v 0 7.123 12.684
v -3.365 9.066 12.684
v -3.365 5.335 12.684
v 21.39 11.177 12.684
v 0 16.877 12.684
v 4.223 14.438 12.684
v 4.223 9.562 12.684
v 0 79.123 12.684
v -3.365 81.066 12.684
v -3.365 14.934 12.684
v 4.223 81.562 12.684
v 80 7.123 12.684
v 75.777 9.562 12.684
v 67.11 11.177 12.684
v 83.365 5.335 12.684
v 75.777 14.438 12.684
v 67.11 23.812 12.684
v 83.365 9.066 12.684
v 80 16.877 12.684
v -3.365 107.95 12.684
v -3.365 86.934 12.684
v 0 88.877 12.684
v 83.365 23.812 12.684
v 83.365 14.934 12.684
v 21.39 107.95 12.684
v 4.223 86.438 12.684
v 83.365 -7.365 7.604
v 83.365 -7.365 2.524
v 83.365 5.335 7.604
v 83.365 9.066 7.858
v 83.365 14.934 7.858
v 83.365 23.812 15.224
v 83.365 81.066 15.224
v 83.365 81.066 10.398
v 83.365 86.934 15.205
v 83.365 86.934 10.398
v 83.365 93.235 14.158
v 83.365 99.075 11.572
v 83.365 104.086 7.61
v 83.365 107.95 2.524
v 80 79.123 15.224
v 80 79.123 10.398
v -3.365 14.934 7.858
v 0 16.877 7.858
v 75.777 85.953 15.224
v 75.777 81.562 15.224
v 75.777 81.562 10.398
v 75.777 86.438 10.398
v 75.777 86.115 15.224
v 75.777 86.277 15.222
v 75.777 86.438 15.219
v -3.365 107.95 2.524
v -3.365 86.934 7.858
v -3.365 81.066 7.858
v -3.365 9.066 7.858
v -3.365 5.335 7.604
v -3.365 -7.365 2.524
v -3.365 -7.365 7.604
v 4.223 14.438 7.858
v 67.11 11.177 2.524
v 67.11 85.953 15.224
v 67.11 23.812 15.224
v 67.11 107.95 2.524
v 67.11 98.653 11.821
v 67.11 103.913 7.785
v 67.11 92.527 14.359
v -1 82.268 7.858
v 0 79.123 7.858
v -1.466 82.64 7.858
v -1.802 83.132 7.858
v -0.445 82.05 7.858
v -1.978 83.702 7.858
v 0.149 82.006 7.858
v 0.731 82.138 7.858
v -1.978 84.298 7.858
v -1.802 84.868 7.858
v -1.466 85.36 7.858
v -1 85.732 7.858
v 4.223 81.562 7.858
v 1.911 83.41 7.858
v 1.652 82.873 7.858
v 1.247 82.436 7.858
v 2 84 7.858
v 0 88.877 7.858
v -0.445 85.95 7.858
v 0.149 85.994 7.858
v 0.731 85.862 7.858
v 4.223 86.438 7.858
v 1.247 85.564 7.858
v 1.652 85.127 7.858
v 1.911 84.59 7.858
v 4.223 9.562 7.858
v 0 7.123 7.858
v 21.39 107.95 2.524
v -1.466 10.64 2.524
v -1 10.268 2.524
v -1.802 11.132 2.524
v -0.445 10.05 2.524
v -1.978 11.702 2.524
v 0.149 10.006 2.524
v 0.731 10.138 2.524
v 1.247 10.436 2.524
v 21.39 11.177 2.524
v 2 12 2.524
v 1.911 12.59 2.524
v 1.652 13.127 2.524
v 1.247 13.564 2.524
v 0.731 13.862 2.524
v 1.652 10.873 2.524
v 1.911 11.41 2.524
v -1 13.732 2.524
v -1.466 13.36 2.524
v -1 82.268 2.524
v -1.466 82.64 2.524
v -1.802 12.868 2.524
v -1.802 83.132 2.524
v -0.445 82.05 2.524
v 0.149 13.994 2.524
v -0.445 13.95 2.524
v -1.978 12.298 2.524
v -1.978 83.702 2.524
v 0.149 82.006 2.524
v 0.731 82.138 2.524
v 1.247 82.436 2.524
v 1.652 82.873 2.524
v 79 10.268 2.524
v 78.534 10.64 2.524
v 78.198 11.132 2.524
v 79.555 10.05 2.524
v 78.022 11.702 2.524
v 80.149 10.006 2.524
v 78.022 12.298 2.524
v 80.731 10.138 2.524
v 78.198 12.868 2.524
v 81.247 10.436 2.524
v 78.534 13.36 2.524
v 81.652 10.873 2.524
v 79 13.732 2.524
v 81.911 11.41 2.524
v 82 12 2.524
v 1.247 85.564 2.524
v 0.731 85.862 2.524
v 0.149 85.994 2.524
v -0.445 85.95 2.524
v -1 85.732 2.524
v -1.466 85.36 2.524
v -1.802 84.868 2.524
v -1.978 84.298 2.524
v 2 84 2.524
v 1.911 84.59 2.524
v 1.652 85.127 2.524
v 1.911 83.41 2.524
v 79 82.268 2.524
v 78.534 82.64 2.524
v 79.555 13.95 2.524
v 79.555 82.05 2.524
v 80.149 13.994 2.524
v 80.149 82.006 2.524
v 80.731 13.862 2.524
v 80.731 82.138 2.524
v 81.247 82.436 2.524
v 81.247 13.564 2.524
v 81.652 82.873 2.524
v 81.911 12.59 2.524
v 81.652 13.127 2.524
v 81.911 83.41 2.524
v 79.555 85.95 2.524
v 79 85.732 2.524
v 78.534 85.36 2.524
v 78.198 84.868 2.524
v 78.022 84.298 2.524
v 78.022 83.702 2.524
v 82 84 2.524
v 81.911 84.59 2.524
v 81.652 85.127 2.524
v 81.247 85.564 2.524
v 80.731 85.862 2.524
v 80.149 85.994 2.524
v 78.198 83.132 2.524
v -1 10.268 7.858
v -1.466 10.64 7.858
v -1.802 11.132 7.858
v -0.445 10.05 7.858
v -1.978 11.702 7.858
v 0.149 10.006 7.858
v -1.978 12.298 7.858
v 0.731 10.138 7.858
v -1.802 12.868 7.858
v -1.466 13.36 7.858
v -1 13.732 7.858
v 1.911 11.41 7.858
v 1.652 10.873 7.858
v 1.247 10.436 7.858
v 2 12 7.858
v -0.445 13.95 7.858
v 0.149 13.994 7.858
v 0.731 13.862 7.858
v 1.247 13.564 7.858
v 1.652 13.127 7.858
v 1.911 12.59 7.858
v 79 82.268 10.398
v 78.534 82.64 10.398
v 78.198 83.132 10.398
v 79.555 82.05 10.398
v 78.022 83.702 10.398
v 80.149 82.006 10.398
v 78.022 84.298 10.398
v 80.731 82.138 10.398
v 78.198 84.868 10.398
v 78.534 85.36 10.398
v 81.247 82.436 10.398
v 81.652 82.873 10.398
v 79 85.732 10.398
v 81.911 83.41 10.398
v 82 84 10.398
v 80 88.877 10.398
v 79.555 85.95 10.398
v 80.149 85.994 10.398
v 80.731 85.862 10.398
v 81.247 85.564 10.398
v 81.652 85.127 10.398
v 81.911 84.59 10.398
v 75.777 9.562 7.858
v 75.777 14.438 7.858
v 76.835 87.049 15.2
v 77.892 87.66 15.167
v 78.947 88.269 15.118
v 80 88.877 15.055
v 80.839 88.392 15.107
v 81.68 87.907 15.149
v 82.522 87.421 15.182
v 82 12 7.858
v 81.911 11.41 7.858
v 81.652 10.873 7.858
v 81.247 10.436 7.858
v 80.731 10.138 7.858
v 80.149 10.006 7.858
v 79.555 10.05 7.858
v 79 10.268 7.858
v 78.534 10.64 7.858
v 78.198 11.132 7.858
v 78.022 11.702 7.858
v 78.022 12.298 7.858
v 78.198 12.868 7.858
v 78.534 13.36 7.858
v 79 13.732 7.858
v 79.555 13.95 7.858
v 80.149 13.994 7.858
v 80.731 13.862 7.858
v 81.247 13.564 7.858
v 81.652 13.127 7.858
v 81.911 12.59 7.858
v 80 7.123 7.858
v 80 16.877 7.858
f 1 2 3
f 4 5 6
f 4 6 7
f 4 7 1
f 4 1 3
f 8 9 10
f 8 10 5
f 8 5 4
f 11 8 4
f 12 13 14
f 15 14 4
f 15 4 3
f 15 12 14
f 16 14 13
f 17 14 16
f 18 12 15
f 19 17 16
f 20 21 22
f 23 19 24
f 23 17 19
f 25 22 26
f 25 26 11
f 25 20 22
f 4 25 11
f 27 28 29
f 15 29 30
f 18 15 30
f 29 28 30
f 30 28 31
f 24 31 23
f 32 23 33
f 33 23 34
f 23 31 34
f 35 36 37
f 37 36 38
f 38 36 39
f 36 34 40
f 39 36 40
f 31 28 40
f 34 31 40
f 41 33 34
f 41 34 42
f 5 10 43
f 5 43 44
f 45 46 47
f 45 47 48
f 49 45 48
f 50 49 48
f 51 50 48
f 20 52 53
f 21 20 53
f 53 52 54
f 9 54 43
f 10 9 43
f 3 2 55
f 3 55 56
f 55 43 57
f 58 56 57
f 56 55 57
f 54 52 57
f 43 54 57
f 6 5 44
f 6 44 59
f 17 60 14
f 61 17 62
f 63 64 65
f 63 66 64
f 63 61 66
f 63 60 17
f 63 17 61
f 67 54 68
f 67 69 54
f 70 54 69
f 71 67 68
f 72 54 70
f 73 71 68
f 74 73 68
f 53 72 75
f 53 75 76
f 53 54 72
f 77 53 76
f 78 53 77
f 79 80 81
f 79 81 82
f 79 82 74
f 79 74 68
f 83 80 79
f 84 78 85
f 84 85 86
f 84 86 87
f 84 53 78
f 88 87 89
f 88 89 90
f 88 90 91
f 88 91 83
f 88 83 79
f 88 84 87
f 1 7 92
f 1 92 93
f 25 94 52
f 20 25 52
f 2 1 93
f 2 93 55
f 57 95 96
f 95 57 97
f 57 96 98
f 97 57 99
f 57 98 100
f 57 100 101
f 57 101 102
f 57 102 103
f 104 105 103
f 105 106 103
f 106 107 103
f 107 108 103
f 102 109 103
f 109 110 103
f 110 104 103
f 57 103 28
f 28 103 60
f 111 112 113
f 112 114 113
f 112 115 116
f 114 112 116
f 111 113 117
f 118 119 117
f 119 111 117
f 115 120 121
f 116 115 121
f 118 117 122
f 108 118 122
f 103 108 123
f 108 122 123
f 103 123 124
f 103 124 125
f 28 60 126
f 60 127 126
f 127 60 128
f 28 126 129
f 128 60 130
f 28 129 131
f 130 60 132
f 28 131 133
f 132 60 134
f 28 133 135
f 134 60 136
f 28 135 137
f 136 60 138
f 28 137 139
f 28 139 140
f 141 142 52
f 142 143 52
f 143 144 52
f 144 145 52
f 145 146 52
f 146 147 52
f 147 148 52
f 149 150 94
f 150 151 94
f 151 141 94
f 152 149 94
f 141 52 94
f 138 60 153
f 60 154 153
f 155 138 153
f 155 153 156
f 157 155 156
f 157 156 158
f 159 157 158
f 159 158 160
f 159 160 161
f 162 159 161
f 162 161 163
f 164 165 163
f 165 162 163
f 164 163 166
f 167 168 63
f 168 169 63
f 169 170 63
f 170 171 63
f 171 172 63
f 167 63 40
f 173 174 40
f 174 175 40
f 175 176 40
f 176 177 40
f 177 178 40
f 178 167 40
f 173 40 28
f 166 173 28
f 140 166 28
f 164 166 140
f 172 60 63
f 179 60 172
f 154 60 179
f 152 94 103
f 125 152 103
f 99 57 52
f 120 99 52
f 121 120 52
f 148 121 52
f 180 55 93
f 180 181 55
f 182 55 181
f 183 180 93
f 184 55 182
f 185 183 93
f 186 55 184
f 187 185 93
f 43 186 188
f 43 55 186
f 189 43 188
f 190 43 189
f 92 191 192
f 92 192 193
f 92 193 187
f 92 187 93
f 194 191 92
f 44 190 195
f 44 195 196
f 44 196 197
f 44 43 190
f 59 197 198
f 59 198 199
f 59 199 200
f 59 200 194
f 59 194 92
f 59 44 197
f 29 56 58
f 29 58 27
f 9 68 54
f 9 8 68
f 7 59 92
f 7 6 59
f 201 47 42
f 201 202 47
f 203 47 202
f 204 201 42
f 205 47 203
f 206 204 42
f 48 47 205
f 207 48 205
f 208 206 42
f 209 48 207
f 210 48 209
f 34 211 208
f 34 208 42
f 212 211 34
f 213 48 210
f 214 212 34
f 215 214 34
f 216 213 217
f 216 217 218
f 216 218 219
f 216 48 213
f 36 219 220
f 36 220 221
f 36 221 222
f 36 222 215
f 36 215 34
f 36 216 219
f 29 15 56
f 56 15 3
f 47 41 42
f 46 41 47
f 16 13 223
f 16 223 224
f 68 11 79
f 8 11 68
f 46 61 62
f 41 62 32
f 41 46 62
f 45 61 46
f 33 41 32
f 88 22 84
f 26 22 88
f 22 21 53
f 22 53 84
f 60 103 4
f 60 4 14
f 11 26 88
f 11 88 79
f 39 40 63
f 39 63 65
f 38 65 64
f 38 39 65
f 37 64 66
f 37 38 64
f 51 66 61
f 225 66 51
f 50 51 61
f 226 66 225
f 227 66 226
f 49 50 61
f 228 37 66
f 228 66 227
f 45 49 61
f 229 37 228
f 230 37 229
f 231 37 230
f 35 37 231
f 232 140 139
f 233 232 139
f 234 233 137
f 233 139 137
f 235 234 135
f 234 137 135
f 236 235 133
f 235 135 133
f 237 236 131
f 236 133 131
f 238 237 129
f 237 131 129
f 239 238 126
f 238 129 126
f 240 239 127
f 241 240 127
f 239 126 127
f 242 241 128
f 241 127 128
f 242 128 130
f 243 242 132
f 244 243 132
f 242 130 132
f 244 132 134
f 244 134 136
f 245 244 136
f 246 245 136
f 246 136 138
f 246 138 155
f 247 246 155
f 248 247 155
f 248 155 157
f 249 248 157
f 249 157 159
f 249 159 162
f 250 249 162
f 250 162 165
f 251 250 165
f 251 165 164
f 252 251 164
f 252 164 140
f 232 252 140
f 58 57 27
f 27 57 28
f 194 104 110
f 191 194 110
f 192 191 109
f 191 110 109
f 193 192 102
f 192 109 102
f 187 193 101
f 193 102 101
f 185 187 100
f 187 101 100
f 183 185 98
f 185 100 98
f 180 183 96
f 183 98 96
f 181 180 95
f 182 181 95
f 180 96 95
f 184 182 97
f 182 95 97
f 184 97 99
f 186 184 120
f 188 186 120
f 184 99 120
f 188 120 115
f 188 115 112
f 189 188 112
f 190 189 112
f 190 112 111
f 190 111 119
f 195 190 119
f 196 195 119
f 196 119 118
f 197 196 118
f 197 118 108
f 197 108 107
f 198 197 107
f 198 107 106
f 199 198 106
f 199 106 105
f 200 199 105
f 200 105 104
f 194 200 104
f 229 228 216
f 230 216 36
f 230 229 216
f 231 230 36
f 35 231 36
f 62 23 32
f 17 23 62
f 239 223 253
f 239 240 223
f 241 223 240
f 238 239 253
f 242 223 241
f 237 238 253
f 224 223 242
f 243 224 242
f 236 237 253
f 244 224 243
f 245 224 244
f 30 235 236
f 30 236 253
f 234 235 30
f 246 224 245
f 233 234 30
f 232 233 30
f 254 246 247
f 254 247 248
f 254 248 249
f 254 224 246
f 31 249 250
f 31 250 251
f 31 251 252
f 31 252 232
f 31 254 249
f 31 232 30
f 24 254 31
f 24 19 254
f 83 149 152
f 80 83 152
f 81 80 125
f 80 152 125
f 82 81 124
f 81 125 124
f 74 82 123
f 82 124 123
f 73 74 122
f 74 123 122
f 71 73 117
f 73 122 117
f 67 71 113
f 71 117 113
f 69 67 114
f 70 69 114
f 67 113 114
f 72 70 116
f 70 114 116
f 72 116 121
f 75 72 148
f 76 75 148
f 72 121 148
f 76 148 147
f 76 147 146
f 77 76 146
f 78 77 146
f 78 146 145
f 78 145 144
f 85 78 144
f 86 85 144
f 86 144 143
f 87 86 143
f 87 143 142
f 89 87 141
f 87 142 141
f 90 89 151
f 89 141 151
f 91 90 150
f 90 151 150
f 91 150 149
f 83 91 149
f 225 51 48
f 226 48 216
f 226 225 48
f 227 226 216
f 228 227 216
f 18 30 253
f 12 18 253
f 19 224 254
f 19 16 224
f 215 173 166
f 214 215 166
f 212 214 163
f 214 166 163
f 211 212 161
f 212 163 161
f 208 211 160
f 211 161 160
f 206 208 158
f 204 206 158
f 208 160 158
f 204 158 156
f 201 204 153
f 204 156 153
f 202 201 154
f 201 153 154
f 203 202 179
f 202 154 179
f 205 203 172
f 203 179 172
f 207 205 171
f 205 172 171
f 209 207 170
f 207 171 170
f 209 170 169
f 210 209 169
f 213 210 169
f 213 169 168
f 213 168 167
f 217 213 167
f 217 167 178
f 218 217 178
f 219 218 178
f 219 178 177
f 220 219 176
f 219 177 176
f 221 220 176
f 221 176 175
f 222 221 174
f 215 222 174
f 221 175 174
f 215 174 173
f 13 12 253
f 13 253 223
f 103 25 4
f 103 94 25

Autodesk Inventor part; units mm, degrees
ref_plane "YZ Plane" through (0, 0, 0) normal (1, 0, 0) x (0, 1, 0)
ref_plane "XZ Plane" through (0, 0, 0) normal (0, 1, 0) x (-1, 0, 0)
ref_plane "Work Plane1" through (0, 0, 2.5241) normal (0, 0, 1) x (1, 0, 0)
sketch "Sketch1" plane through (0, 0, 2.5241) normal (0, 0, 1) x (1, 0, 0)
  line L0 (-4, 272) -> (-4, -8) construction
  line L1 (4, 272) -> (4, -8) construction
  line L2 (76, 272) -> (76, -8) construction
  line L3 (84, 272) -> (84, -8) construction
  line L4 (84, -8) -> (-4, -8) construction
  line L5 (84, 106) -> (80, 106) construction
  line L6 (80, 110) -> (76, 110) construction
  line L7 (-3.365, 272) -> (-3.365, -7.365) construction
  line L8 (-3.365, -7.365) -> (83.365, -7.365) construction
  line L9 (83.365, -7.365) -> (83.365, 272) construction
  line L10 (-3.365, -7.365) -> (83.365, -7.365)
  line L11 (83.365, -7.365) -> (83.365, 107.95)
  line L12 (-3.365, 107.95) -> (-3.365, -7.365)
  circle A0 centre (0, 12) radius 2
  circle A1 centre (80, 12) radius 2
  circle A2 centre (0, 84) radius 2
  circle A3 centre (80, 84) radius 2
  line L13 (21.39, 107.95) -> (21.39, 11.177)
  line L14 (21.39, 11.177) -> (67.11, 11.177)
  line L15 (67.11, 11.177) -> (67.11, 107.95)
  line L16 (83.365, 107.95) -> (67.11, 107.95)
  line L17 (21.39, 107.95) -> (-3.365, 107.95)
  point P0 (0, 0)
  dimension "d0" = 0.635
  dimension "d1" = 8.89
  dimension "d2" = 45.72
  dimension "d18" = 18.542
extrude "Extrusion1" add sketch "Sketch1" along normal blind 10.16
sketch "Sketch2" plane through (0, 0, 12.6841) normal (0, 0, 1) x (1, 0, 0)
  line L0 (83.365, 107.95) -> (67.11, 107.95) projected
  line L1 (83.365, -7.365) -> (83.365, 107.95) projected
  line L2 (67.11, 107.95) -> (83.365, 107.95)
  line L3 (83.365, 107.95) -> (83.365, 23.8125)
  line L4 (83.365, 23.8125) -> (67.11, 23.8125)
  line L5 (67.11, 23.8125) -> (67.11, 107.95)
  circle A0 centre (80, 84) radius 2 projected
  circle A1 centre (80, 84) radius 1.9939
  point P0 (0, 0)
  dimension "d5" = 3.9878
extrude "Extrusion2" add sketch "Sketch2" along normal blind 2.54 contours L1 L4 L5 L0
fillet "Fillet1" radius 25.4 1 edges at (75.2375, 107.95, 15.2241)
sketch "Sketch3" plane through (0, 0, 12.6841) normal (0, 0, 1) x (1, 0, 0)
  circle A0 centre (0, 12) radius 2 construction
  circle A1 centre (0, 12) radius 4.8768 construction
  circle A2 centre (0, 84) radius 2 construction
  circle A3 centre (0, 84) radius 4.8768 construction
  circle A4 centre (80, 12) radius 2 construction
  circle A5 centre (80, 12) radius 4.8768 construction
  line L0 (80, 16.8768) -> (84.2234, 14.4384)
  line L1 (84.2234, 14.4384) -> (84.2234, 9.5616)
  line L2 (84.2234, 9.5616) -> (80, 7.1232)
  line L3 (80, 7.1232) -> (75.7766, 9.5616)
  line L4 (75.7766, 9.5616) -> (75.7766, 14.4384)
  line L5 (75.7766, 14.4384) -> (80, 16.8768)
  line L6 (0, 16.8768) -> (4.2234, 14.4384)
  line L7 (4.2234, 14.4384) -> (4.2234, 9.5616)
  line L8 (4.2234, 9.5616) -> (0, 7.1232)
  line L9 (0, 7.1232) -> (-4.2234, 9.5616)
  line L10 (-4.2234, 9.5616) -> (-4.2234, 14.4384)
  line L11 (-4.2234, 14.4384) -> (0, 16.8768)
  line L12 (0, 88.8768) -> (4.2234, 86.4384)
  line L13 (4.2234, 86.4384) -> (4.2234, 81.5616)
  line L14 (4.2234, 81.5616) -> (0, 79.1232)
  line L15 (0, 79.1232) -> (-4.2234, 81.5616)
  line L16 (-4.2234, 81.5616) -> (-4.2234, 86.4384)
  line L17 (-4.2234, 86.4384) -> (0, 88.8768)
  point P0 (0, 0)
  dimension "d9" = 9.7536
  dimension "d10" = 9.7536
  dimension "d11" = 9.7536
extrude "Extrusion3" cut sketch "Sketch3" against normal blind 4.826
sketch "Sketch4" plane through (0, 0, 15.2241) normal (0, 0, 1) x (1, 0, 0)
  circle A0 centre (80, 84) radius 2 construction
  circle A1 centre (80, 84) radius 4.8768 construction
  line L0 (80, 88.8768) -> (84.2234, 86.4384)
  line L1 (84.2234, 86.4384) -> (84.2234, 81.5616)
  line L2 (84.2234, 81.5616) -> (80, 79.1232)
  line L3 (80, 79.1232) -> (75.7766, 81.5616)
  line L4 (75.7766, 81.5616) -> (75.7766, 86.4384)
  line L5 (75.7766, 86.4384) -> (80, 88.8768)
  point P0 (0, 0)
  dimension "d14" = 9.7536
extrude "Extrusion4" cut sketch "Sketch4" against normal blind 4.826
sketch "Sketch5" plane through (0, 0, 12.6841) normal (0, 0, 1) x (1, 0, 0)
  line L0 (-3.365, -7.365) -> (83.365, -7.365) projected
  line L1 (83.365, -7.365) -> (83.365, 107.95) projected
  line L2 (-3.365, -7.365) -> (83.365, -7.365)
  line L3 (83.365, -7.365) -> (83.365, 5.335)
  line L4 (83.365, 5.335) -> (-3.365, 5.335)
  line L5 (-3.365, 5.335) -> (-3.365, -7.365)
  point P0 (0, 0)
  dimension "d19" = 12.7
extrude "Extrusion5" cut sketch "Sketch5" against normal blind 5.08
properties part number "Old Back Wall"
